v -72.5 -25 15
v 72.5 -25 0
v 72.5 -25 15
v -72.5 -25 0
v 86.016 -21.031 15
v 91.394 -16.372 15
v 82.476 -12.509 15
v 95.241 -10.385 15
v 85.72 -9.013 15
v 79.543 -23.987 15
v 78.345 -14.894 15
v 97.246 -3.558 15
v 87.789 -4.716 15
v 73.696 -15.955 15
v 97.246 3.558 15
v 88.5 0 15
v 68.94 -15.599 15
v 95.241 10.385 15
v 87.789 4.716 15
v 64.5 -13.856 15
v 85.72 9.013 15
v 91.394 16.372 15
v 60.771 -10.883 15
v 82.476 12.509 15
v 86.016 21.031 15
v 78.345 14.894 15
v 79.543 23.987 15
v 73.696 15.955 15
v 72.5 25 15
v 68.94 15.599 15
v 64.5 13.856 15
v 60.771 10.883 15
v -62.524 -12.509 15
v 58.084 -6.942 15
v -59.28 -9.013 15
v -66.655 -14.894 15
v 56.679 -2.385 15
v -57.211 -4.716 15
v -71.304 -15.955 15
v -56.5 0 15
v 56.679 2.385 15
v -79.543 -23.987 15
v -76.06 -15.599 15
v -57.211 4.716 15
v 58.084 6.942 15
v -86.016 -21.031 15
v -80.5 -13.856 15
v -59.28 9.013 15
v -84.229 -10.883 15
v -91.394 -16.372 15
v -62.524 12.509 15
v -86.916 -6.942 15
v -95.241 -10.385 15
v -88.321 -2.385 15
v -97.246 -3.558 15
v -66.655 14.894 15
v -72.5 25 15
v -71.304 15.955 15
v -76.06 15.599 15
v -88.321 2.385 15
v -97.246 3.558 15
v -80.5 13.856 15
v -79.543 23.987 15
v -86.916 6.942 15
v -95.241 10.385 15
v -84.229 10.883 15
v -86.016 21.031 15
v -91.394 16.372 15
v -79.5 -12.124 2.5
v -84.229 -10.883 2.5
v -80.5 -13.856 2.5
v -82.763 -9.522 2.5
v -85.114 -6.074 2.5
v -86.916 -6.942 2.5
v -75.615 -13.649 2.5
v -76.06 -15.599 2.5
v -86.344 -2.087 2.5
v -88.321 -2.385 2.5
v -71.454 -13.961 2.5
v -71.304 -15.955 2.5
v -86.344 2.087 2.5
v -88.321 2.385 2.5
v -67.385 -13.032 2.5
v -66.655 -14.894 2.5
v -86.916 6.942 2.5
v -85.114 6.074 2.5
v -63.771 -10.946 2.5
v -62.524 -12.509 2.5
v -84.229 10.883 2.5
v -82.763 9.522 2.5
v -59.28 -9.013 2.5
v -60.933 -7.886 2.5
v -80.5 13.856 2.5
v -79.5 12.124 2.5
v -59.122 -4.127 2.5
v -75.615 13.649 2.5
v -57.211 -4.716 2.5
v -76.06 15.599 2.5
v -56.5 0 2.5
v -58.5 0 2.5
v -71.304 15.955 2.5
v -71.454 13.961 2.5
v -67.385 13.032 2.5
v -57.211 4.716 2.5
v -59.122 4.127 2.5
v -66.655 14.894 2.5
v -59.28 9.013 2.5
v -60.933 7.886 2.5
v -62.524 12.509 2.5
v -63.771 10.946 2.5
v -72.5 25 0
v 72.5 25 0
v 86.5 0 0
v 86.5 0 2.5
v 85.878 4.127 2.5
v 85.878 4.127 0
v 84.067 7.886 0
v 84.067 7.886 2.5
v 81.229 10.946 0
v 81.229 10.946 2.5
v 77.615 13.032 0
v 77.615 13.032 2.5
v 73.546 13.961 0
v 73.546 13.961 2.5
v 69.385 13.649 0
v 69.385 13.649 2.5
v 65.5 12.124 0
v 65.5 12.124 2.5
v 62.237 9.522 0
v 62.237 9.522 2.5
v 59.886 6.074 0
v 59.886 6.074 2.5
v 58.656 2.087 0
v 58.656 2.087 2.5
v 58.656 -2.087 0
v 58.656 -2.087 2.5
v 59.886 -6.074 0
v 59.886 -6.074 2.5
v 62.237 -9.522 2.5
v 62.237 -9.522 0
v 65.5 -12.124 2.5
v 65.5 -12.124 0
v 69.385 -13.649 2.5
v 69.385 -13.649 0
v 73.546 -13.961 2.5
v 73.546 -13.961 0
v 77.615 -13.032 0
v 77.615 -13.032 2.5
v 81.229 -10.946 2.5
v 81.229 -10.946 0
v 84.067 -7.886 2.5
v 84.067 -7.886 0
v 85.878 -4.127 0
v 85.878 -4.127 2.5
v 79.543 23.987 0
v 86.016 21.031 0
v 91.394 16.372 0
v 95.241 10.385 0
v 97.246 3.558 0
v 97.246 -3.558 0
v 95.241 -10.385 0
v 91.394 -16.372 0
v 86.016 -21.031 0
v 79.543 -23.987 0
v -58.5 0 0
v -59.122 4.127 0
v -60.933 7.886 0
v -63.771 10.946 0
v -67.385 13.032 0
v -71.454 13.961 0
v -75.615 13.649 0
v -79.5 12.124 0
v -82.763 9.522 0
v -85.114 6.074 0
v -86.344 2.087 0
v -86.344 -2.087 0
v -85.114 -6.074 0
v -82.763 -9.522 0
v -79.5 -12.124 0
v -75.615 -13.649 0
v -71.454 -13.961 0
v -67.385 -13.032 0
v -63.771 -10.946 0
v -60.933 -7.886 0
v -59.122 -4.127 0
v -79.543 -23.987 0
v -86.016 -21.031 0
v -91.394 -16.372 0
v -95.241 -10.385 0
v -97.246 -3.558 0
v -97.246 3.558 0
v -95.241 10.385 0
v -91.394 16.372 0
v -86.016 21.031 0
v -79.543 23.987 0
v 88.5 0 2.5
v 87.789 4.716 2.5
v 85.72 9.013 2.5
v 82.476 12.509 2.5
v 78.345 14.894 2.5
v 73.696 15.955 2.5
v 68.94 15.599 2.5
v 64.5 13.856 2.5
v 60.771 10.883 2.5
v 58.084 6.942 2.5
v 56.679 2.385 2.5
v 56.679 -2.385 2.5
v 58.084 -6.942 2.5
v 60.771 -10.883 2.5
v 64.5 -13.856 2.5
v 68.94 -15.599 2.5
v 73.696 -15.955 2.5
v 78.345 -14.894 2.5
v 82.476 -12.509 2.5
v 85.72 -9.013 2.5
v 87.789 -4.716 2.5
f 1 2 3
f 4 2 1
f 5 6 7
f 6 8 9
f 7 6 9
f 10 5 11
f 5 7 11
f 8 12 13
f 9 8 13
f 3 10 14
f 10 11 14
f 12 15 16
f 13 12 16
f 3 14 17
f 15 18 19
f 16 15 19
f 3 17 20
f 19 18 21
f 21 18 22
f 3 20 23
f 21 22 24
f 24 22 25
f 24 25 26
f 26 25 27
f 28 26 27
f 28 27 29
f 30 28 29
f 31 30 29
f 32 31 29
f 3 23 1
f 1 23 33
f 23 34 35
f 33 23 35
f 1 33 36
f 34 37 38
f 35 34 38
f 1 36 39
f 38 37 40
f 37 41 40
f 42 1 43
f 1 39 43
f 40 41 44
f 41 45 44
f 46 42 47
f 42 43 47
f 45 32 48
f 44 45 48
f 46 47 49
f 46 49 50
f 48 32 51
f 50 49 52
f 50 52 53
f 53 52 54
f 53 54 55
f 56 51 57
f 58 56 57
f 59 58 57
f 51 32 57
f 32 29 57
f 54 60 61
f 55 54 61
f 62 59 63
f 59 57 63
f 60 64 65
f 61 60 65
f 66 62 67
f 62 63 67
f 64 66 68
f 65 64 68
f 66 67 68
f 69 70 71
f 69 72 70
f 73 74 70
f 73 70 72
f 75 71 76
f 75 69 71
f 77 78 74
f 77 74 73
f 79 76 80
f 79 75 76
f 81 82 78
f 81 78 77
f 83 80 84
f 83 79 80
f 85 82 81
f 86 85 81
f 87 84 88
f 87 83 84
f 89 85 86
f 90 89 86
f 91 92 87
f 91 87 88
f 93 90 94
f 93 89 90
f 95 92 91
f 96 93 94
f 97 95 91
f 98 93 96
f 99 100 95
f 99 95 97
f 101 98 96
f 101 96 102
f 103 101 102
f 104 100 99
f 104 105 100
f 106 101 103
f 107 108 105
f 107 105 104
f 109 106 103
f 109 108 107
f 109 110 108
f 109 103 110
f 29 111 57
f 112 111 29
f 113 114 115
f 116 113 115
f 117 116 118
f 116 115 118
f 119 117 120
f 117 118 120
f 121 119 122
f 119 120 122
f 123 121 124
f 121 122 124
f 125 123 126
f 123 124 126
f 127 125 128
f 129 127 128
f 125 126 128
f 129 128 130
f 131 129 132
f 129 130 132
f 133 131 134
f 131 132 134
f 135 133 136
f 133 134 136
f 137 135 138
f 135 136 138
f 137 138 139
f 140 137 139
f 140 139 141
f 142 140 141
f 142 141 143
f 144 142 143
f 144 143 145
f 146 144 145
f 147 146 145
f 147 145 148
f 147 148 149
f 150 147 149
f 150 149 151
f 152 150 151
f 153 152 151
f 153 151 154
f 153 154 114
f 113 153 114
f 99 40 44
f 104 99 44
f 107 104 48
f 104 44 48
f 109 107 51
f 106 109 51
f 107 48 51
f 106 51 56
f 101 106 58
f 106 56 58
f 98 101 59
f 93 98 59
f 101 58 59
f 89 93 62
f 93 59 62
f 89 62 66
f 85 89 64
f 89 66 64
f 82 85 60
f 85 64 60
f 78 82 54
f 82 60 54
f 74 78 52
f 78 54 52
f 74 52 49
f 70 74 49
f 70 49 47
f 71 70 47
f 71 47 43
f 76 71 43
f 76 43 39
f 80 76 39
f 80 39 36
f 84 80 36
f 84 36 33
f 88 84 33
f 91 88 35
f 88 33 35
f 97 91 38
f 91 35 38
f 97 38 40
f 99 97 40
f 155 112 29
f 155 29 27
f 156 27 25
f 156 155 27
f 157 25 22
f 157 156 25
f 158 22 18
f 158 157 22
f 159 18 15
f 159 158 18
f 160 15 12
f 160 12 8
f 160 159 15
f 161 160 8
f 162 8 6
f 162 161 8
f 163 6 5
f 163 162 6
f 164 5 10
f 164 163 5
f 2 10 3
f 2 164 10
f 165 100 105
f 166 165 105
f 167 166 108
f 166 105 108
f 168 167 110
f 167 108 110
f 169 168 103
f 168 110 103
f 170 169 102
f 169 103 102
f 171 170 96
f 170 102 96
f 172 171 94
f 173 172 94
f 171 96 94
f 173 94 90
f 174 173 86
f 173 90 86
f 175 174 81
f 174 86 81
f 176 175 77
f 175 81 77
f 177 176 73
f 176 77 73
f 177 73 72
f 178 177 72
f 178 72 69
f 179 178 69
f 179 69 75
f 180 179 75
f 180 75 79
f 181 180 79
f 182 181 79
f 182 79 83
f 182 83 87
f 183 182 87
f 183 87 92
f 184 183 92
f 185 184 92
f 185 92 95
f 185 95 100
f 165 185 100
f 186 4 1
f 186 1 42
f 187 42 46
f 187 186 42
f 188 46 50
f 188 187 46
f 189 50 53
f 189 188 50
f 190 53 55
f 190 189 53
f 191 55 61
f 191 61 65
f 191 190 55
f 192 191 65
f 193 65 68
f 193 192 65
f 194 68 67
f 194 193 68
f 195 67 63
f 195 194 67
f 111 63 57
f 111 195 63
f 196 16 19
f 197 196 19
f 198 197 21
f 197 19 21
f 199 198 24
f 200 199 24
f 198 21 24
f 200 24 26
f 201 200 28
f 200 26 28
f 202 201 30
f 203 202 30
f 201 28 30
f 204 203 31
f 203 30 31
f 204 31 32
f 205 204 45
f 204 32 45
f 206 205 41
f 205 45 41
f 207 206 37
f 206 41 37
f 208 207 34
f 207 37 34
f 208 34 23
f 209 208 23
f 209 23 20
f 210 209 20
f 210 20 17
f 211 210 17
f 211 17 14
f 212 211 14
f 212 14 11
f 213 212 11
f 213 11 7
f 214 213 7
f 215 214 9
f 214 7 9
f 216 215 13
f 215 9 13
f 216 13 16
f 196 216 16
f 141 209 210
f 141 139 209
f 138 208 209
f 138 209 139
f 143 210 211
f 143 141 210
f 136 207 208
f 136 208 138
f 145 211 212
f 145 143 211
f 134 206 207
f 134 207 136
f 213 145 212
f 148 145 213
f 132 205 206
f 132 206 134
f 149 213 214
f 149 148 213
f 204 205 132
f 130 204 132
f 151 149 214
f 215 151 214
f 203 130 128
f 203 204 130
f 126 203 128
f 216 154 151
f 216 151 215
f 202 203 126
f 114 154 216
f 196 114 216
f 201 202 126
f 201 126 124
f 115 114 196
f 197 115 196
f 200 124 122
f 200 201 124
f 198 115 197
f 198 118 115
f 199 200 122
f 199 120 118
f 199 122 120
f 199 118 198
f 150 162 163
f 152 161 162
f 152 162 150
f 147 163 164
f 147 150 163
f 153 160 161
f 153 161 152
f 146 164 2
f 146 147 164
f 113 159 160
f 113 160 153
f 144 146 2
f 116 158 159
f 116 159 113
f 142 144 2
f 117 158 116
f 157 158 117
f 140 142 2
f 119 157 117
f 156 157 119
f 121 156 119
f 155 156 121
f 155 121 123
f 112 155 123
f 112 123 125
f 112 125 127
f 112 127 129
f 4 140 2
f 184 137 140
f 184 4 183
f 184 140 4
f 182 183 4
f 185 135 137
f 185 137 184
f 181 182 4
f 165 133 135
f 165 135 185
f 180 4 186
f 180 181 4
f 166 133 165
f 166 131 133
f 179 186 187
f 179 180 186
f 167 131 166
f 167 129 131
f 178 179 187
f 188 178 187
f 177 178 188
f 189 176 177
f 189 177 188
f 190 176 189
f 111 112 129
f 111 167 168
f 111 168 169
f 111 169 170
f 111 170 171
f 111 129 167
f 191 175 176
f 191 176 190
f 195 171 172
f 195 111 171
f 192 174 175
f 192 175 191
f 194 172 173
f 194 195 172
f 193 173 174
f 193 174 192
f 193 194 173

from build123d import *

# Parameters (mm, degrees)
EXTRUDE_1_DEPTH          = 15
SKETCH_2_R               = 16
CUT_EXTRUDE_1_DEPTH      = 12.5
SKETCH_3_R               = 14
CUT_EXTRUDE_2_DEPTH      = 1
CUT_EXTRUDE_2_DEPTH_BACK = 16


with BuildPart() as part:
    # 草图1 → 凸台-拉伸1 (new body)
    with BuildSketch(Plane.XY):
        with BuildLine():
            Line((-72.5, 25), (72.5, 25))
            ThreePointArc((72.5, 25), (97.5, 0), (72.5, -25))
            Line((72.5, -25), (-72.5, -25))
            ThreePointArc((-72.5, -25), (-97.5, 0), (-72.5, 25))
        make_face()
    extrude(amount=EXTRUDE_1_DEPTH)

    # 草图2 → 切除-拉伸1 (cut)
    with BuildSketch(Plane.XY.offset(15)):
        with Locations((-72.5, 0)):
            Circle(SKETCH_2_R)
        with Locations((72.5, 0)):
            Circle(SKETCH_2_R)
    extrude(amount=-CUT_EXTRUDE_1_DEPTH, mode=Mode.SUBTRACT)

    # 草图3 → 切除-拉伸2 (cut, two sides)
    with BuildSketch(Plane.XY.offset(15)) as cut_extrude_2_sk:
        with Locations((-72.5, 0)):
            Circle(SKETCH_3_R)
        with Locations((72.5, 0)):
            Circle(SKETCH_3_R)
    extrude(amount=CUT_EXTRUDE_2_DEPTH, mode=Mode.SUBTRACT)
    extrude(cut_extrude_2_sk.sketch, amount=-CUT_EXTRUDE_2_DEPTH_BACK, mode=Mode.SUBTRACT)


solid = part.part
